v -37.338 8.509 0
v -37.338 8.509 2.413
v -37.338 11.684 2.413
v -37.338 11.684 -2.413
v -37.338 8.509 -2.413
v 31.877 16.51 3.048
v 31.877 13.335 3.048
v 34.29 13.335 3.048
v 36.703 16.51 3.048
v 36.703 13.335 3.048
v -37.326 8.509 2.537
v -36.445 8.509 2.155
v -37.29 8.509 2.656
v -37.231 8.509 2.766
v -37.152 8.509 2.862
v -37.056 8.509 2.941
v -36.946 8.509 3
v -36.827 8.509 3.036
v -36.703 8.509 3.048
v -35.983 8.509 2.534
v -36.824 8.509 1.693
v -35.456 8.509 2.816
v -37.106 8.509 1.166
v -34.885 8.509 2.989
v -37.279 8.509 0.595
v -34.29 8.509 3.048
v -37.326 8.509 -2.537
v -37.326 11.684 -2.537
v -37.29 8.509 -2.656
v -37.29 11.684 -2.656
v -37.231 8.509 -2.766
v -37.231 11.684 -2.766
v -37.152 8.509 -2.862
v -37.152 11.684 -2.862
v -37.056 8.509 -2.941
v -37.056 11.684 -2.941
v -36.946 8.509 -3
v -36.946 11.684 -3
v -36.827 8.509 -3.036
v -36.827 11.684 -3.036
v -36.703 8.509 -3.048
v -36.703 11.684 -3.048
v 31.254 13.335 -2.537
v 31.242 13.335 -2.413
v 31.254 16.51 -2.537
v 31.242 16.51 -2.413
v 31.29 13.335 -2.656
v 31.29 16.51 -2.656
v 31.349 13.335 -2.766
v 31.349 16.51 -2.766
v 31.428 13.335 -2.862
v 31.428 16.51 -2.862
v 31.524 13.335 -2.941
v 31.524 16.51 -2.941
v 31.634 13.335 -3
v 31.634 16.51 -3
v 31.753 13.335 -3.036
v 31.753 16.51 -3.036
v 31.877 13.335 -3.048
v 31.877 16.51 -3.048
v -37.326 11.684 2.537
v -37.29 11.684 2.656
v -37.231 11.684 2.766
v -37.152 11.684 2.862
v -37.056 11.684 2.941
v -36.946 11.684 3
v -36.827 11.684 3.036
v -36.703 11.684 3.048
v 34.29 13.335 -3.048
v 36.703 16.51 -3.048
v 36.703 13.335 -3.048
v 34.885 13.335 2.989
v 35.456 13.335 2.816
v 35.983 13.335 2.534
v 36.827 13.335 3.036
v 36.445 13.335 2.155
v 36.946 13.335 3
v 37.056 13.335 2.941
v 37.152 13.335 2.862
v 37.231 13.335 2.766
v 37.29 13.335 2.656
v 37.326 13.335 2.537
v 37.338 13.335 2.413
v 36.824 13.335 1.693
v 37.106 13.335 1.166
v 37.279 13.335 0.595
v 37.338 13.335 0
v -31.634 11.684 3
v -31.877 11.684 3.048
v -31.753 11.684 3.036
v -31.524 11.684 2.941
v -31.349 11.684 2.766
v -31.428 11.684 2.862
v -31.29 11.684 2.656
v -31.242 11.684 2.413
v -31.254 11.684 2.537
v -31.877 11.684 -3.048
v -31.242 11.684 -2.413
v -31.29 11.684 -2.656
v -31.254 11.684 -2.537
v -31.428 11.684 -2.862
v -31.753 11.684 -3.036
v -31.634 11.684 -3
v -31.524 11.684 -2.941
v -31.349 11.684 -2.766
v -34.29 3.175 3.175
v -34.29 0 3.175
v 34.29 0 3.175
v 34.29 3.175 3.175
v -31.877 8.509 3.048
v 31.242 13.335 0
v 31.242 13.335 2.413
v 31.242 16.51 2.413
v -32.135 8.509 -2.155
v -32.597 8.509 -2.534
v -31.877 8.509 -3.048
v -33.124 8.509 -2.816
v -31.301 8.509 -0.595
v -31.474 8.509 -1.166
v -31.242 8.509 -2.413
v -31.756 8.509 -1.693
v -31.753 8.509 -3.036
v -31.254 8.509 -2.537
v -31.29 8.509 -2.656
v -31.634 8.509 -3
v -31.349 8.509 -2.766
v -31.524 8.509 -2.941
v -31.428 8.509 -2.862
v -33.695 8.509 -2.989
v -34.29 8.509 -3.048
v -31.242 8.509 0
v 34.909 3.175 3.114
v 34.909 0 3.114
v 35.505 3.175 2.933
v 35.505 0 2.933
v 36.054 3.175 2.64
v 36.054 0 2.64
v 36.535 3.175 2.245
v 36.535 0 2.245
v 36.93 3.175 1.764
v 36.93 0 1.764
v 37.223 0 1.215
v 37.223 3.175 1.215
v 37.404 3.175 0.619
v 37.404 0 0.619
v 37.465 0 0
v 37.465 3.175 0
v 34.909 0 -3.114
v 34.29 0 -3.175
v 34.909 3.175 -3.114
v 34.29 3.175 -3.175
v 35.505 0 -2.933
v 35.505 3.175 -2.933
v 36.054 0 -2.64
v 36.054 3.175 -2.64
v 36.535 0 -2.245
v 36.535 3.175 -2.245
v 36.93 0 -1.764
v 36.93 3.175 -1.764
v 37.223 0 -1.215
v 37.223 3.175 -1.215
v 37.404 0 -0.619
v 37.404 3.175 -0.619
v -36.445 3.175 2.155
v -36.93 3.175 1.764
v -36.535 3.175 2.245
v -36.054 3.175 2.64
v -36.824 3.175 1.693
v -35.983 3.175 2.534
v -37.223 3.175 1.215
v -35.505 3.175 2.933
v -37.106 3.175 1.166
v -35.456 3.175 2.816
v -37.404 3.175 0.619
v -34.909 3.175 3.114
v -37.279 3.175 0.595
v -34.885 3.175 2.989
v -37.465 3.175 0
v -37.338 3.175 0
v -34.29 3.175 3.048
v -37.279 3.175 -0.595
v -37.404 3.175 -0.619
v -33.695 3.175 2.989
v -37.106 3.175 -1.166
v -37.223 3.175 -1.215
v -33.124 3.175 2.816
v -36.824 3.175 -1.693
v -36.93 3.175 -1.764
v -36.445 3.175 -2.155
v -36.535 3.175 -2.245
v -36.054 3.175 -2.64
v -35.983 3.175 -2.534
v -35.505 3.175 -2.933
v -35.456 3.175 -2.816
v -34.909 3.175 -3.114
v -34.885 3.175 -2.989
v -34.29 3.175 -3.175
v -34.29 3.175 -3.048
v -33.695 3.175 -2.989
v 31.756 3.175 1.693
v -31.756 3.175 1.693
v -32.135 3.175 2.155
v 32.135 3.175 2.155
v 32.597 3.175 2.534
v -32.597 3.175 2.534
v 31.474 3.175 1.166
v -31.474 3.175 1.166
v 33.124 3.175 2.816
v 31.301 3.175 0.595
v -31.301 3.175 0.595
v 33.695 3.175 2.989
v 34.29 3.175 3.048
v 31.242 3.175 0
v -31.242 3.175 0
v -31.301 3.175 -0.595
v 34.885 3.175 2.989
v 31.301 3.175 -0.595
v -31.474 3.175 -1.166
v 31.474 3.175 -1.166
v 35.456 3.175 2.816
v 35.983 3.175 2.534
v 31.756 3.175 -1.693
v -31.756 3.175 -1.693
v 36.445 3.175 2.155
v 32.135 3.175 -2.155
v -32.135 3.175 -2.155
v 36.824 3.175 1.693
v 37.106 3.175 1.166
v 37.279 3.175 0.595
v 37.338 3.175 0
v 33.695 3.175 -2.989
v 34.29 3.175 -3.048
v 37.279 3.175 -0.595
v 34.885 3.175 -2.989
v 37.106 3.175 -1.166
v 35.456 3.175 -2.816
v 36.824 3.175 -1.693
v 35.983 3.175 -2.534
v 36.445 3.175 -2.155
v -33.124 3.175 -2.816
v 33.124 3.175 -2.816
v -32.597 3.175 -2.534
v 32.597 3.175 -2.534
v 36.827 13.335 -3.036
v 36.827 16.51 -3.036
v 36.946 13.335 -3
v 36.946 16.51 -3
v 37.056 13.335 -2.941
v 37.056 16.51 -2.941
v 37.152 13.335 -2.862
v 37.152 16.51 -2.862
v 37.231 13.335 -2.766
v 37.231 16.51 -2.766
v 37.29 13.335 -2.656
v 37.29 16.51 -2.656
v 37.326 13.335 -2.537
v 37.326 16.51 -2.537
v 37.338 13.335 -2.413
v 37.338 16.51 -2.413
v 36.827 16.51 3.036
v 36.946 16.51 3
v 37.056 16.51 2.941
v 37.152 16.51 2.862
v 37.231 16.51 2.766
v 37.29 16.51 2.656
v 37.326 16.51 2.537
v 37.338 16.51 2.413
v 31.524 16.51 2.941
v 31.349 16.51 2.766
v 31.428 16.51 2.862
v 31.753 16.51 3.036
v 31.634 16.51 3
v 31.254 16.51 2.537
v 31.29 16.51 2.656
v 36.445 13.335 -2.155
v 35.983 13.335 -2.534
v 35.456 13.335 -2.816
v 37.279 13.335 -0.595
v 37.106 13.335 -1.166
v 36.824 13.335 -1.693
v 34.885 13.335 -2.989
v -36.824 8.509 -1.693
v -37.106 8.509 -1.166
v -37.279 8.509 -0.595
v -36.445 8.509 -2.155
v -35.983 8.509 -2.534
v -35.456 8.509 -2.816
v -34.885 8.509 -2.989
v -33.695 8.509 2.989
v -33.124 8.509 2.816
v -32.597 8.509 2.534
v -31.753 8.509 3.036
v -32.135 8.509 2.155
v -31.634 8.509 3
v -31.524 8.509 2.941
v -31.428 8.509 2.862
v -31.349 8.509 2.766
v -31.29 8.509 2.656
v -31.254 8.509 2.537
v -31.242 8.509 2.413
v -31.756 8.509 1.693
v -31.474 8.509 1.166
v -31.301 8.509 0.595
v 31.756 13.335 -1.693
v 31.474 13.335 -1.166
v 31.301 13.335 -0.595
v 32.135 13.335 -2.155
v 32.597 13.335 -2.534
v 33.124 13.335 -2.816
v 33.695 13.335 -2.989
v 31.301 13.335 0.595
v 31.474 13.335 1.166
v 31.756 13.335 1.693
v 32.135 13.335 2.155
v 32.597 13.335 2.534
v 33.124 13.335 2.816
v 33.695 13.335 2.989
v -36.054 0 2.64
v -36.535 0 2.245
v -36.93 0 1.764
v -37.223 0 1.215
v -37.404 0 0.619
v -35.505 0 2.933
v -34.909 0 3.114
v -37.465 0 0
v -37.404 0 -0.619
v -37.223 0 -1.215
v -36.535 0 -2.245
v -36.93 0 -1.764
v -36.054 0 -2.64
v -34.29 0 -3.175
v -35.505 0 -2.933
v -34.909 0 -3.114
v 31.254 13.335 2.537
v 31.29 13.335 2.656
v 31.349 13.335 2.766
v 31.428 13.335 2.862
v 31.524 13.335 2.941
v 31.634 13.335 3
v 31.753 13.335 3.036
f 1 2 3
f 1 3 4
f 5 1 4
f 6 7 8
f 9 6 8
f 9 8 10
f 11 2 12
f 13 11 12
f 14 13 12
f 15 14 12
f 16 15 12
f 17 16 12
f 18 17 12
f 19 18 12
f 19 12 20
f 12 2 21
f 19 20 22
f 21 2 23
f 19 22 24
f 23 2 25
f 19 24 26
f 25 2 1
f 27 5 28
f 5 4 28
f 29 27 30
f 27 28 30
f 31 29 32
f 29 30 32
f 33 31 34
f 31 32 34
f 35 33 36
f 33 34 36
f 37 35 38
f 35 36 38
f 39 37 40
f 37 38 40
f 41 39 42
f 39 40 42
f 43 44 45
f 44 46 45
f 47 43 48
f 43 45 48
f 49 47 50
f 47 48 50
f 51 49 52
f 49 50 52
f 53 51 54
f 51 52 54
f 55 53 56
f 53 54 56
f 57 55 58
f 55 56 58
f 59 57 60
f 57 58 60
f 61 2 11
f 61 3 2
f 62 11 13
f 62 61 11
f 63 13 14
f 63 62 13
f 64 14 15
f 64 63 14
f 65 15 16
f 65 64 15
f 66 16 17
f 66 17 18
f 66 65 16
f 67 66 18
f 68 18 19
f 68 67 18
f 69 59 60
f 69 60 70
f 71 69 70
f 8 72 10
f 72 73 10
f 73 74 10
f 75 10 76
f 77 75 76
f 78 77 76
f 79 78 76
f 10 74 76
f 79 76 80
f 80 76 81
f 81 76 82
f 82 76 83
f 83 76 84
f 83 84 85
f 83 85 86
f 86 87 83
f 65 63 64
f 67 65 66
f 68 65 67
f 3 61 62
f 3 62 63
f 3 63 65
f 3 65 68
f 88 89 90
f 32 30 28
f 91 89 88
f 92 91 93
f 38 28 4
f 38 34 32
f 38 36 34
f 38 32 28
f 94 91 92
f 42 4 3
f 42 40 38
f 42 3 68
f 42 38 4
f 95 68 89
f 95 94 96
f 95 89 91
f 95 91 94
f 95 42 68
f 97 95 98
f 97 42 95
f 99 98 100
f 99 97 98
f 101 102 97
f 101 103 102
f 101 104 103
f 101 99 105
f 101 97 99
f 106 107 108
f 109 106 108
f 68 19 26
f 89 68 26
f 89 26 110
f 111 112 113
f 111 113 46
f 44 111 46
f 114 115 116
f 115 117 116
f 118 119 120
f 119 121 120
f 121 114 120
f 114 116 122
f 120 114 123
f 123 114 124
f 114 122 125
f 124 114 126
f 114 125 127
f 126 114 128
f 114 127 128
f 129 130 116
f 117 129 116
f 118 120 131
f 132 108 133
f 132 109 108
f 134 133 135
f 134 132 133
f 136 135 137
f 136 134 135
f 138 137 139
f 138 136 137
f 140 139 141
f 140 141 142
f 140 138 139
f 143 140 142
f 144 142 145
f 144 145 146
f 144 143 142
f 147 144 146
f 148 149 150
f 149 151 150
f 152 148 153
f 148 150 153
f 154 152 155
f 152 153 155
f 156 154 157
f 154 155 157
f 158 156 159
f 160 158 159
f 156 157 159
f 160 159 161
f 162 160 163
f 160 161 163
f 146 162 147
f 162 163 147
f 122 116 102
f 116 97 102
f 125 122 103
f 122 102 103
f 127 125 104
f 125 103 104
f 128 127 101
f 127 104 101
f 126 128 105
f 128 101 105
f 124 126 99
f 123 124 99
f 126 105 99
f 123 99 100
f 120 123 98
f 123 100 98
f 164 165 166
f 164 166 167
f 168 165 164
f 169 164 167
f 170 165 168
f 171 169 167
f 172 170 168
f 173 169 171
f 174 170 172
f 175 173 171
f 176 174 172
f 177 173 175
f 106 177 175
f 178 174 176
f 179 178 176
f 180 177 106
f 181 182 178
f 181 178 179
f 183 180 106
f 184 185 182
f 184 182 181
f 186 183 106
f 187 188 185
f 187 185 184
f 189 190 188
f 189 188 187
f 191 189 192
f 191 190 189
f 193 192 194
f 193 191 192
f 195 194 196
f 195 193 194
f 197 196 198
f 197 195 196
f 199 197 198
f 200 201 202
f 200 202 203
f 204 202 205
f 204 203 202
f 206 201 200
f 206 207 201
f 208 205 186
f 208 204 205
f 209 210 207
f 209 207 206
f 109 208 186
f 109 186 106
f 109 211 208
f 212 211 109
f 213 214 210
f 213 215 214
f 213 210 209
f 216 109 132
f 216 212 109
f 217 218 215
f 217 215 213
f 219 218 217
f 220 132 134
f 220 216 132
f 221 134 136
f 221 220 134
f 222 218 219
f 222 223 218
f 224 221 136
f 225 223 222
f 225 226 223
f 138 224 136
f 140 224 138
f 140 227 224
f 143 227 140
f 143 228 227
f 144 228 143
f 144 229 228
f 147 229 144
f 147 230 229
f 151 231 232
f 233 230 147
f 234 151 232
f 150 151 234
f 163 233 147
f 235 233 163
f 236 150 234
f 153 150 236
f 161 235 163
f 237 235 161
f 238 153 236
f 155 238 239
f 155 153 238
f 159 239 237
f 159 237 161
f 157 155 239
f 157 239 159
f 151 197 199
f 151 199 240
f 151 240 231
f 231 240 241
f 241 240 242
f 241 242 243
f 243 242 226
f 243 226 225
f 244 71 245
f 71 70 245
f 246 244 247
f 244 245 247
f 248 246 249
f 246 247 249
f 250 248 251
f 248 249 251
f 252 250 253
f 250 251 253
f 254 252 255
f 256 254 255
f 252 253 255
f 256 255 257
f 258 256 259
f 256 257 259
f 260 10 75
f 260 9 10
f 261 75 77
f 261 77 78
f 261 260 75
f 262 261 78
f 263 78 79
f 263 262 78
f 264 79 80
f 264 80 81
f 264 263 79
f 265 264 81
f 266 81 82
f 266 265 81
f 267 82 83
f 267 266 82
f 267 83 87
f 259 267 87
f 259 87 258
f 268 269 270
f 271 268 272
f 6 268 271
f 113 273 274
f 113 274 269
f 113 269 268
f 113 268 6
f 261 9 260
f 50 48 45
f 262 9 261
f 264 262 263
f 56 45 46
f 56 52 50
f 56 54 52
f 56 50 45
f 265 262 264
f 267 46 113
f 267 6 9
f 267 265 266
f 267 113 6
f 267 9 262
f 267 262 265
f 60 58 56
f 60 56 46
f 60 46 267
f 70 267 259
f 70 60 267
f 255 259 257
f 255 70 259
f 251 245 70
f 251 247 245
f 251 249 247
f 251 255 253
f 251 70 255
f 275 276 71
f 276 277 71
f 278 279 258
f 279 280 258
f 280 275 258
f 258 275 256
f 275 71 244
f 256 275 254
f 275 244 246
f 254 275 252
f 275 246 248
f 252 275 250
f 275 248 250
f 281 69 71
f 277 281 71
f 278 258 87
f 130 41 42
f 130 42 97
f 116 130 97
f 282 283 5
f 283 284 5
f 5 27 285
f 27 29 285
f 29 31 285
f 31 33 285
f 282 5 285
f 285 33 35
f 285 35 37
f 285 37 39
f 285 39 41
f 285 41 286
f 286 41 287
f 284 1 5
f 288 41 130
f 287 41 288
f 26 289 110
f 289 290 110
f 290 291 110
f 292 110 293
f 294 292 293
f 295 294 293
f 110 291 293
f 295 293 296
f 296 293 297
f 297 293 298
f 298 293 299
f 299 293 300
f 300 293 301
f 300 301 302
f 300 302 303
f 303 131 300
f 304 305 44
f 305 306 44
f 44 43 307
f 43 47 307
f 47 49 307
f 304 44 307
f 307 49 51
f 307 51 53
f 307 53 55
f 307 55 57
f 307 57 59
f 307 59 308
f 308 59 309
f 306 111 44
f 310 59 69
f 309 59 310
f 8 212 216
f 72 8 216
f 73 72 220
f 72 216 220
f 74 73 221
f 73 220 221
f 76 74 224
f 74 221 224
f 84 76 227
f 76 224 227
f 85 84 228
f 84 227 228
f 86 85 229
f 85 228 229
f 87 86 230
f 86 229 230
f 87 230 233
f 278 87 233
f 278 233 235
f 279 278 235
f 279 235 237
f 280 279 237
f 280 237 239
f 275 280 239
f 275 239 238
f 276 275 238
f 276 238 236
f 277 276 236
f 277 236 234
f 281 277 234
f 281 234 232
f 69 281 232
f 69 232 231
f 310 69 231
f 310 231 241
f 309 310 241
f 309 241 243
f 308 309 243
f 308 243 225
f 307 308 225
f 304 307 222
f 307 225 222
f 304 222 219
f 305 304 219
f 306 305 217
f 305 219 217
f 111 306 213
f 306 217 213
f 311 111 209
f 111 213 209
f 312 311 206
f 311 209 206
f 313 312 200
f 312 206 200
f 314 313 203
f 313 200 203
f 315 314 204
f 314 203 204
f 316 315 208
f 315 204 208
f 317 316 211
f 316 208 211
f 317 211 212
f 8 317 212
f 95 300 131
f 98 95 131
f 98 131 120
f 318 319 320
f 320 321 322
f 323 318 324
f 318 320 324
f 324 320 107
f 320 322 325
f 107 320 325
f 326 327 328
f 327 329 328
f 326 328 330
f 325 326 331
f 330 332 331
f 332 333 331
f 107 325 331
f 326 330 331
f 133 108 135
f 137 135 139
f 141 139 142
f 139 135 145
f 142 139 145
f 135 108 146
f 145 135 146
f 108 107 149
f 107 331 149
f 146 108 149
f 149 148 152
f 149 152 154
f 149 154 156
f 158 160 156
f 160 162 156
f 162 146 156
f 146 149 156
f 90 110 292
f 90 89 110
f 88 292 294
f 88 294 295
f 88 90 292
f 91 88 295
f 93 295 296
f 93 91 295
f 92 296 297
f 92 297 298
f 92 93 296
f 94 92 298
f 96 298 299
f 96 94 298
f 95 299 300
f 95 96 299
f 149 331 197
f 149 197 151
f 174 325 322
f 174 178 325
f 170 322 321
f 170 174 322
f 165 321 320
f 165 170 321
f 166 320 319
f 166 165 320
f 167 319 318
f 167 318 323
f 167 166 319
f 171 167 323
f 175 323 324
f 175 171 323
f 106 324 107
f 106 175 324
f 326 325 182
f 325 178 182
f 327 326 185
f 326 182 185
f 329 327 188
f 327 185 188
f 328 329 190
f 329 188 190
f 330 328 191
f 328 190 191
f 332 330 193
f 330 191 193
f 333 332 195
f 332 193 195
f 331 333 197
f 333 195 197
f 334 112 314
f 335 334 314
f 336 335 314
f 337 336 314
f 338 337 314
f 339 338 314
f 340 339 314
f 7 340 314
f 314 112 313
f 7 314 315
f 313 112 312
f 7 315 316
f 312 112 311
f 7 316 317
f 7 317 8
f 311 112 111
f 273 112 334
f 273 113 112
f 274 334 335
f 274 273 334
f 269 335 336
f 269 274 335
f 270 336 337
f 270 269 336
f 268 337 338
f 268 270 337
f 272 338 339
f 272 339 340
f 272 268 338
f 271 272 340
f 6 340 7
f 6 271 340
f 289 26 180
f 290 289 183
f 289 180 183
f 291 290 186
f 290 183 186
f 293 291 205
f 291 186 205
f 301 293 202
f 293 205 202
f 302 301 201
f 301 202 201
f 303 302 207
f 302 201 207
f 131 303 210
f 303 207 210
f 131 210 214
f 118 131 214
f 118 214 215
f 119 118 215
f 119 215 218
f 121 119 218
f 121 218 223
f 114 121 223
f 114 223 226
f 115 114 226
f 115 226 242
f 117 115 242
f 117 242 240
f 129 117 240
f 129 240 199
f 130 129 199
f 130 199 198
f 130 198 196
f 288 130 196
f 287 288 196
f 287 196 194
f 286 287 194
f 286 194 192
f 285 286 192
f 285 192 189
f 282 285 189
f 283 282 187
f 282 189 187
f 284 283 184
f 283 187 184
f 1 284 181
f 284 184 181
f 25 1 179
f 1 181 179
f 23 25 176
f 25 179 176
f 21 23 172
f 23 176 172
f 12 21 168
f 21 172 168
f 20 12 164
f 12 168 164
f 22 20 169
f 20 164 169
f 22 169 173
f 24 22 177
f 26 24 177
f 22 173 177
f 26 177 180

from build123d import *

# Parameters (mm, degrees)
SKETCH1_W           = 74.93
SKETCH1_H           = 6.35
BOSS_EXTRUDE1_DEPTH = 3.175
SKETCH2_R           = 3.048
BOSS_EXTRUDE2_DEPTH = 5.334
SKETCH3_W           = 6.096
SKETCH3_H           = 6.096
BOSS_EXTRUDE3_DEPTH = 3.175
SKETCH4_R           = 3.048
BOSS_EXTRUDE4_DEPTH = 10.16
SKETCH5_W           = 6.096
SKETCH5_H           = 6.096
BOSS_EXTRUDE5_DEPTH = 3.175
FILLET1_R           = 0.635
FILLET2_R           = 3.175


with BuildPart() as part:
    # Sketch1 → Boss-Extrude1 (new body)
    with BuildSketch(Plane(origin=(0, 0, 0), x_dir=(1, 0, 0), z_dir=(0, 1, 0))):
        Rectangle(SKETCH1_W, SKETCH1_H)
    extrude(amount=BOSS_EXTRUDE1_DEPTH)

    # Sketch2 → Boss-Extrude2 (add)
    with BuildSketch(Plane(origin=(0, 3.175, 0), x_dir=(1, 0, 0), z_dir=(0, 1, 0))):
        with Locations(Location((-34.29, 0, 0), (0, 0, 270))):
            Circle(SKETCH2_R)
    extrude(amount=BOSS_EXTRUDE2_DEPTH)

    # Sketch3 → Boss-Extrude3 (add)
    with BuildSketch(Plane(origin=(0, 8.509, 0), x_dir=(1, 0, 0), z_dir=(0, 1, 0))):
        with Locations((-34.29, 0)):
            Rectangle(SKETCH3_W, SKETCH3_H)
    extrude(amount=BOSS_EXTRUDE3_DEPTH)

    # Sketch4 → Boss-Extrude4 (add)
    with BuildSketch(Plane(origin=(0, 3.175, 0), x_dir=(1, 0, 0), z_dir=(0, 1, 0))):
        with Locations(Location((34.29, 0, 0), (0, 0, 270))):
            Circle(SKETCH4_R)
    extrude(amount=BOSS_EXTRUDE4_DEPTH)

    # Sketch5 → Boss-Extrude5 (add)
    with BuildSketch(Plane(origin=(0, 13.335, 0), x_dir=(1, 0, 0), z_dir=(0, 1, 0))):
        with Locations((34.29, 0)):
            Rectangle(SKETCH5_W, SKETCH5_H)
    extrude(amount=BOSS_EXTRUDE5_DEPTH)

    # Fillet1
    fillet1_edges = [part.edges().sort_by_distance(p)[0] for p in [
        (-37.338, 10.0965, -3.048),
        (-37.338, 10.0965, 3.048),
        (-31.242, 10.0965, 3.048),
        (-31.242, 10.0965, -3.048),
        (37.338, 14.9225, 3.048),
        (37.338, 14.9225, -3.048),
        (31.242, 14.9225, -3.048),
        (31.242, 14.9225, 3.048),
    ]]
    fillet(fillet1_edges, radius=FILLET1_R)

    # Fillet2
    fillet2_edges = [part.edges().sort_by_distance(p)[0] for p in [
        (-37.465, 1.5875, 3.175),
        (-37.465, 1.5875, -3.175),
        (37.465, 1.5875, -3.175),
        (37.465, 1.5875, 3.175),
    ]]
    fillet(fillet2_edges, radius=FILLET2_R - 0.0001)  # a hair under: the kernel refuses the full size


solid = part.part
